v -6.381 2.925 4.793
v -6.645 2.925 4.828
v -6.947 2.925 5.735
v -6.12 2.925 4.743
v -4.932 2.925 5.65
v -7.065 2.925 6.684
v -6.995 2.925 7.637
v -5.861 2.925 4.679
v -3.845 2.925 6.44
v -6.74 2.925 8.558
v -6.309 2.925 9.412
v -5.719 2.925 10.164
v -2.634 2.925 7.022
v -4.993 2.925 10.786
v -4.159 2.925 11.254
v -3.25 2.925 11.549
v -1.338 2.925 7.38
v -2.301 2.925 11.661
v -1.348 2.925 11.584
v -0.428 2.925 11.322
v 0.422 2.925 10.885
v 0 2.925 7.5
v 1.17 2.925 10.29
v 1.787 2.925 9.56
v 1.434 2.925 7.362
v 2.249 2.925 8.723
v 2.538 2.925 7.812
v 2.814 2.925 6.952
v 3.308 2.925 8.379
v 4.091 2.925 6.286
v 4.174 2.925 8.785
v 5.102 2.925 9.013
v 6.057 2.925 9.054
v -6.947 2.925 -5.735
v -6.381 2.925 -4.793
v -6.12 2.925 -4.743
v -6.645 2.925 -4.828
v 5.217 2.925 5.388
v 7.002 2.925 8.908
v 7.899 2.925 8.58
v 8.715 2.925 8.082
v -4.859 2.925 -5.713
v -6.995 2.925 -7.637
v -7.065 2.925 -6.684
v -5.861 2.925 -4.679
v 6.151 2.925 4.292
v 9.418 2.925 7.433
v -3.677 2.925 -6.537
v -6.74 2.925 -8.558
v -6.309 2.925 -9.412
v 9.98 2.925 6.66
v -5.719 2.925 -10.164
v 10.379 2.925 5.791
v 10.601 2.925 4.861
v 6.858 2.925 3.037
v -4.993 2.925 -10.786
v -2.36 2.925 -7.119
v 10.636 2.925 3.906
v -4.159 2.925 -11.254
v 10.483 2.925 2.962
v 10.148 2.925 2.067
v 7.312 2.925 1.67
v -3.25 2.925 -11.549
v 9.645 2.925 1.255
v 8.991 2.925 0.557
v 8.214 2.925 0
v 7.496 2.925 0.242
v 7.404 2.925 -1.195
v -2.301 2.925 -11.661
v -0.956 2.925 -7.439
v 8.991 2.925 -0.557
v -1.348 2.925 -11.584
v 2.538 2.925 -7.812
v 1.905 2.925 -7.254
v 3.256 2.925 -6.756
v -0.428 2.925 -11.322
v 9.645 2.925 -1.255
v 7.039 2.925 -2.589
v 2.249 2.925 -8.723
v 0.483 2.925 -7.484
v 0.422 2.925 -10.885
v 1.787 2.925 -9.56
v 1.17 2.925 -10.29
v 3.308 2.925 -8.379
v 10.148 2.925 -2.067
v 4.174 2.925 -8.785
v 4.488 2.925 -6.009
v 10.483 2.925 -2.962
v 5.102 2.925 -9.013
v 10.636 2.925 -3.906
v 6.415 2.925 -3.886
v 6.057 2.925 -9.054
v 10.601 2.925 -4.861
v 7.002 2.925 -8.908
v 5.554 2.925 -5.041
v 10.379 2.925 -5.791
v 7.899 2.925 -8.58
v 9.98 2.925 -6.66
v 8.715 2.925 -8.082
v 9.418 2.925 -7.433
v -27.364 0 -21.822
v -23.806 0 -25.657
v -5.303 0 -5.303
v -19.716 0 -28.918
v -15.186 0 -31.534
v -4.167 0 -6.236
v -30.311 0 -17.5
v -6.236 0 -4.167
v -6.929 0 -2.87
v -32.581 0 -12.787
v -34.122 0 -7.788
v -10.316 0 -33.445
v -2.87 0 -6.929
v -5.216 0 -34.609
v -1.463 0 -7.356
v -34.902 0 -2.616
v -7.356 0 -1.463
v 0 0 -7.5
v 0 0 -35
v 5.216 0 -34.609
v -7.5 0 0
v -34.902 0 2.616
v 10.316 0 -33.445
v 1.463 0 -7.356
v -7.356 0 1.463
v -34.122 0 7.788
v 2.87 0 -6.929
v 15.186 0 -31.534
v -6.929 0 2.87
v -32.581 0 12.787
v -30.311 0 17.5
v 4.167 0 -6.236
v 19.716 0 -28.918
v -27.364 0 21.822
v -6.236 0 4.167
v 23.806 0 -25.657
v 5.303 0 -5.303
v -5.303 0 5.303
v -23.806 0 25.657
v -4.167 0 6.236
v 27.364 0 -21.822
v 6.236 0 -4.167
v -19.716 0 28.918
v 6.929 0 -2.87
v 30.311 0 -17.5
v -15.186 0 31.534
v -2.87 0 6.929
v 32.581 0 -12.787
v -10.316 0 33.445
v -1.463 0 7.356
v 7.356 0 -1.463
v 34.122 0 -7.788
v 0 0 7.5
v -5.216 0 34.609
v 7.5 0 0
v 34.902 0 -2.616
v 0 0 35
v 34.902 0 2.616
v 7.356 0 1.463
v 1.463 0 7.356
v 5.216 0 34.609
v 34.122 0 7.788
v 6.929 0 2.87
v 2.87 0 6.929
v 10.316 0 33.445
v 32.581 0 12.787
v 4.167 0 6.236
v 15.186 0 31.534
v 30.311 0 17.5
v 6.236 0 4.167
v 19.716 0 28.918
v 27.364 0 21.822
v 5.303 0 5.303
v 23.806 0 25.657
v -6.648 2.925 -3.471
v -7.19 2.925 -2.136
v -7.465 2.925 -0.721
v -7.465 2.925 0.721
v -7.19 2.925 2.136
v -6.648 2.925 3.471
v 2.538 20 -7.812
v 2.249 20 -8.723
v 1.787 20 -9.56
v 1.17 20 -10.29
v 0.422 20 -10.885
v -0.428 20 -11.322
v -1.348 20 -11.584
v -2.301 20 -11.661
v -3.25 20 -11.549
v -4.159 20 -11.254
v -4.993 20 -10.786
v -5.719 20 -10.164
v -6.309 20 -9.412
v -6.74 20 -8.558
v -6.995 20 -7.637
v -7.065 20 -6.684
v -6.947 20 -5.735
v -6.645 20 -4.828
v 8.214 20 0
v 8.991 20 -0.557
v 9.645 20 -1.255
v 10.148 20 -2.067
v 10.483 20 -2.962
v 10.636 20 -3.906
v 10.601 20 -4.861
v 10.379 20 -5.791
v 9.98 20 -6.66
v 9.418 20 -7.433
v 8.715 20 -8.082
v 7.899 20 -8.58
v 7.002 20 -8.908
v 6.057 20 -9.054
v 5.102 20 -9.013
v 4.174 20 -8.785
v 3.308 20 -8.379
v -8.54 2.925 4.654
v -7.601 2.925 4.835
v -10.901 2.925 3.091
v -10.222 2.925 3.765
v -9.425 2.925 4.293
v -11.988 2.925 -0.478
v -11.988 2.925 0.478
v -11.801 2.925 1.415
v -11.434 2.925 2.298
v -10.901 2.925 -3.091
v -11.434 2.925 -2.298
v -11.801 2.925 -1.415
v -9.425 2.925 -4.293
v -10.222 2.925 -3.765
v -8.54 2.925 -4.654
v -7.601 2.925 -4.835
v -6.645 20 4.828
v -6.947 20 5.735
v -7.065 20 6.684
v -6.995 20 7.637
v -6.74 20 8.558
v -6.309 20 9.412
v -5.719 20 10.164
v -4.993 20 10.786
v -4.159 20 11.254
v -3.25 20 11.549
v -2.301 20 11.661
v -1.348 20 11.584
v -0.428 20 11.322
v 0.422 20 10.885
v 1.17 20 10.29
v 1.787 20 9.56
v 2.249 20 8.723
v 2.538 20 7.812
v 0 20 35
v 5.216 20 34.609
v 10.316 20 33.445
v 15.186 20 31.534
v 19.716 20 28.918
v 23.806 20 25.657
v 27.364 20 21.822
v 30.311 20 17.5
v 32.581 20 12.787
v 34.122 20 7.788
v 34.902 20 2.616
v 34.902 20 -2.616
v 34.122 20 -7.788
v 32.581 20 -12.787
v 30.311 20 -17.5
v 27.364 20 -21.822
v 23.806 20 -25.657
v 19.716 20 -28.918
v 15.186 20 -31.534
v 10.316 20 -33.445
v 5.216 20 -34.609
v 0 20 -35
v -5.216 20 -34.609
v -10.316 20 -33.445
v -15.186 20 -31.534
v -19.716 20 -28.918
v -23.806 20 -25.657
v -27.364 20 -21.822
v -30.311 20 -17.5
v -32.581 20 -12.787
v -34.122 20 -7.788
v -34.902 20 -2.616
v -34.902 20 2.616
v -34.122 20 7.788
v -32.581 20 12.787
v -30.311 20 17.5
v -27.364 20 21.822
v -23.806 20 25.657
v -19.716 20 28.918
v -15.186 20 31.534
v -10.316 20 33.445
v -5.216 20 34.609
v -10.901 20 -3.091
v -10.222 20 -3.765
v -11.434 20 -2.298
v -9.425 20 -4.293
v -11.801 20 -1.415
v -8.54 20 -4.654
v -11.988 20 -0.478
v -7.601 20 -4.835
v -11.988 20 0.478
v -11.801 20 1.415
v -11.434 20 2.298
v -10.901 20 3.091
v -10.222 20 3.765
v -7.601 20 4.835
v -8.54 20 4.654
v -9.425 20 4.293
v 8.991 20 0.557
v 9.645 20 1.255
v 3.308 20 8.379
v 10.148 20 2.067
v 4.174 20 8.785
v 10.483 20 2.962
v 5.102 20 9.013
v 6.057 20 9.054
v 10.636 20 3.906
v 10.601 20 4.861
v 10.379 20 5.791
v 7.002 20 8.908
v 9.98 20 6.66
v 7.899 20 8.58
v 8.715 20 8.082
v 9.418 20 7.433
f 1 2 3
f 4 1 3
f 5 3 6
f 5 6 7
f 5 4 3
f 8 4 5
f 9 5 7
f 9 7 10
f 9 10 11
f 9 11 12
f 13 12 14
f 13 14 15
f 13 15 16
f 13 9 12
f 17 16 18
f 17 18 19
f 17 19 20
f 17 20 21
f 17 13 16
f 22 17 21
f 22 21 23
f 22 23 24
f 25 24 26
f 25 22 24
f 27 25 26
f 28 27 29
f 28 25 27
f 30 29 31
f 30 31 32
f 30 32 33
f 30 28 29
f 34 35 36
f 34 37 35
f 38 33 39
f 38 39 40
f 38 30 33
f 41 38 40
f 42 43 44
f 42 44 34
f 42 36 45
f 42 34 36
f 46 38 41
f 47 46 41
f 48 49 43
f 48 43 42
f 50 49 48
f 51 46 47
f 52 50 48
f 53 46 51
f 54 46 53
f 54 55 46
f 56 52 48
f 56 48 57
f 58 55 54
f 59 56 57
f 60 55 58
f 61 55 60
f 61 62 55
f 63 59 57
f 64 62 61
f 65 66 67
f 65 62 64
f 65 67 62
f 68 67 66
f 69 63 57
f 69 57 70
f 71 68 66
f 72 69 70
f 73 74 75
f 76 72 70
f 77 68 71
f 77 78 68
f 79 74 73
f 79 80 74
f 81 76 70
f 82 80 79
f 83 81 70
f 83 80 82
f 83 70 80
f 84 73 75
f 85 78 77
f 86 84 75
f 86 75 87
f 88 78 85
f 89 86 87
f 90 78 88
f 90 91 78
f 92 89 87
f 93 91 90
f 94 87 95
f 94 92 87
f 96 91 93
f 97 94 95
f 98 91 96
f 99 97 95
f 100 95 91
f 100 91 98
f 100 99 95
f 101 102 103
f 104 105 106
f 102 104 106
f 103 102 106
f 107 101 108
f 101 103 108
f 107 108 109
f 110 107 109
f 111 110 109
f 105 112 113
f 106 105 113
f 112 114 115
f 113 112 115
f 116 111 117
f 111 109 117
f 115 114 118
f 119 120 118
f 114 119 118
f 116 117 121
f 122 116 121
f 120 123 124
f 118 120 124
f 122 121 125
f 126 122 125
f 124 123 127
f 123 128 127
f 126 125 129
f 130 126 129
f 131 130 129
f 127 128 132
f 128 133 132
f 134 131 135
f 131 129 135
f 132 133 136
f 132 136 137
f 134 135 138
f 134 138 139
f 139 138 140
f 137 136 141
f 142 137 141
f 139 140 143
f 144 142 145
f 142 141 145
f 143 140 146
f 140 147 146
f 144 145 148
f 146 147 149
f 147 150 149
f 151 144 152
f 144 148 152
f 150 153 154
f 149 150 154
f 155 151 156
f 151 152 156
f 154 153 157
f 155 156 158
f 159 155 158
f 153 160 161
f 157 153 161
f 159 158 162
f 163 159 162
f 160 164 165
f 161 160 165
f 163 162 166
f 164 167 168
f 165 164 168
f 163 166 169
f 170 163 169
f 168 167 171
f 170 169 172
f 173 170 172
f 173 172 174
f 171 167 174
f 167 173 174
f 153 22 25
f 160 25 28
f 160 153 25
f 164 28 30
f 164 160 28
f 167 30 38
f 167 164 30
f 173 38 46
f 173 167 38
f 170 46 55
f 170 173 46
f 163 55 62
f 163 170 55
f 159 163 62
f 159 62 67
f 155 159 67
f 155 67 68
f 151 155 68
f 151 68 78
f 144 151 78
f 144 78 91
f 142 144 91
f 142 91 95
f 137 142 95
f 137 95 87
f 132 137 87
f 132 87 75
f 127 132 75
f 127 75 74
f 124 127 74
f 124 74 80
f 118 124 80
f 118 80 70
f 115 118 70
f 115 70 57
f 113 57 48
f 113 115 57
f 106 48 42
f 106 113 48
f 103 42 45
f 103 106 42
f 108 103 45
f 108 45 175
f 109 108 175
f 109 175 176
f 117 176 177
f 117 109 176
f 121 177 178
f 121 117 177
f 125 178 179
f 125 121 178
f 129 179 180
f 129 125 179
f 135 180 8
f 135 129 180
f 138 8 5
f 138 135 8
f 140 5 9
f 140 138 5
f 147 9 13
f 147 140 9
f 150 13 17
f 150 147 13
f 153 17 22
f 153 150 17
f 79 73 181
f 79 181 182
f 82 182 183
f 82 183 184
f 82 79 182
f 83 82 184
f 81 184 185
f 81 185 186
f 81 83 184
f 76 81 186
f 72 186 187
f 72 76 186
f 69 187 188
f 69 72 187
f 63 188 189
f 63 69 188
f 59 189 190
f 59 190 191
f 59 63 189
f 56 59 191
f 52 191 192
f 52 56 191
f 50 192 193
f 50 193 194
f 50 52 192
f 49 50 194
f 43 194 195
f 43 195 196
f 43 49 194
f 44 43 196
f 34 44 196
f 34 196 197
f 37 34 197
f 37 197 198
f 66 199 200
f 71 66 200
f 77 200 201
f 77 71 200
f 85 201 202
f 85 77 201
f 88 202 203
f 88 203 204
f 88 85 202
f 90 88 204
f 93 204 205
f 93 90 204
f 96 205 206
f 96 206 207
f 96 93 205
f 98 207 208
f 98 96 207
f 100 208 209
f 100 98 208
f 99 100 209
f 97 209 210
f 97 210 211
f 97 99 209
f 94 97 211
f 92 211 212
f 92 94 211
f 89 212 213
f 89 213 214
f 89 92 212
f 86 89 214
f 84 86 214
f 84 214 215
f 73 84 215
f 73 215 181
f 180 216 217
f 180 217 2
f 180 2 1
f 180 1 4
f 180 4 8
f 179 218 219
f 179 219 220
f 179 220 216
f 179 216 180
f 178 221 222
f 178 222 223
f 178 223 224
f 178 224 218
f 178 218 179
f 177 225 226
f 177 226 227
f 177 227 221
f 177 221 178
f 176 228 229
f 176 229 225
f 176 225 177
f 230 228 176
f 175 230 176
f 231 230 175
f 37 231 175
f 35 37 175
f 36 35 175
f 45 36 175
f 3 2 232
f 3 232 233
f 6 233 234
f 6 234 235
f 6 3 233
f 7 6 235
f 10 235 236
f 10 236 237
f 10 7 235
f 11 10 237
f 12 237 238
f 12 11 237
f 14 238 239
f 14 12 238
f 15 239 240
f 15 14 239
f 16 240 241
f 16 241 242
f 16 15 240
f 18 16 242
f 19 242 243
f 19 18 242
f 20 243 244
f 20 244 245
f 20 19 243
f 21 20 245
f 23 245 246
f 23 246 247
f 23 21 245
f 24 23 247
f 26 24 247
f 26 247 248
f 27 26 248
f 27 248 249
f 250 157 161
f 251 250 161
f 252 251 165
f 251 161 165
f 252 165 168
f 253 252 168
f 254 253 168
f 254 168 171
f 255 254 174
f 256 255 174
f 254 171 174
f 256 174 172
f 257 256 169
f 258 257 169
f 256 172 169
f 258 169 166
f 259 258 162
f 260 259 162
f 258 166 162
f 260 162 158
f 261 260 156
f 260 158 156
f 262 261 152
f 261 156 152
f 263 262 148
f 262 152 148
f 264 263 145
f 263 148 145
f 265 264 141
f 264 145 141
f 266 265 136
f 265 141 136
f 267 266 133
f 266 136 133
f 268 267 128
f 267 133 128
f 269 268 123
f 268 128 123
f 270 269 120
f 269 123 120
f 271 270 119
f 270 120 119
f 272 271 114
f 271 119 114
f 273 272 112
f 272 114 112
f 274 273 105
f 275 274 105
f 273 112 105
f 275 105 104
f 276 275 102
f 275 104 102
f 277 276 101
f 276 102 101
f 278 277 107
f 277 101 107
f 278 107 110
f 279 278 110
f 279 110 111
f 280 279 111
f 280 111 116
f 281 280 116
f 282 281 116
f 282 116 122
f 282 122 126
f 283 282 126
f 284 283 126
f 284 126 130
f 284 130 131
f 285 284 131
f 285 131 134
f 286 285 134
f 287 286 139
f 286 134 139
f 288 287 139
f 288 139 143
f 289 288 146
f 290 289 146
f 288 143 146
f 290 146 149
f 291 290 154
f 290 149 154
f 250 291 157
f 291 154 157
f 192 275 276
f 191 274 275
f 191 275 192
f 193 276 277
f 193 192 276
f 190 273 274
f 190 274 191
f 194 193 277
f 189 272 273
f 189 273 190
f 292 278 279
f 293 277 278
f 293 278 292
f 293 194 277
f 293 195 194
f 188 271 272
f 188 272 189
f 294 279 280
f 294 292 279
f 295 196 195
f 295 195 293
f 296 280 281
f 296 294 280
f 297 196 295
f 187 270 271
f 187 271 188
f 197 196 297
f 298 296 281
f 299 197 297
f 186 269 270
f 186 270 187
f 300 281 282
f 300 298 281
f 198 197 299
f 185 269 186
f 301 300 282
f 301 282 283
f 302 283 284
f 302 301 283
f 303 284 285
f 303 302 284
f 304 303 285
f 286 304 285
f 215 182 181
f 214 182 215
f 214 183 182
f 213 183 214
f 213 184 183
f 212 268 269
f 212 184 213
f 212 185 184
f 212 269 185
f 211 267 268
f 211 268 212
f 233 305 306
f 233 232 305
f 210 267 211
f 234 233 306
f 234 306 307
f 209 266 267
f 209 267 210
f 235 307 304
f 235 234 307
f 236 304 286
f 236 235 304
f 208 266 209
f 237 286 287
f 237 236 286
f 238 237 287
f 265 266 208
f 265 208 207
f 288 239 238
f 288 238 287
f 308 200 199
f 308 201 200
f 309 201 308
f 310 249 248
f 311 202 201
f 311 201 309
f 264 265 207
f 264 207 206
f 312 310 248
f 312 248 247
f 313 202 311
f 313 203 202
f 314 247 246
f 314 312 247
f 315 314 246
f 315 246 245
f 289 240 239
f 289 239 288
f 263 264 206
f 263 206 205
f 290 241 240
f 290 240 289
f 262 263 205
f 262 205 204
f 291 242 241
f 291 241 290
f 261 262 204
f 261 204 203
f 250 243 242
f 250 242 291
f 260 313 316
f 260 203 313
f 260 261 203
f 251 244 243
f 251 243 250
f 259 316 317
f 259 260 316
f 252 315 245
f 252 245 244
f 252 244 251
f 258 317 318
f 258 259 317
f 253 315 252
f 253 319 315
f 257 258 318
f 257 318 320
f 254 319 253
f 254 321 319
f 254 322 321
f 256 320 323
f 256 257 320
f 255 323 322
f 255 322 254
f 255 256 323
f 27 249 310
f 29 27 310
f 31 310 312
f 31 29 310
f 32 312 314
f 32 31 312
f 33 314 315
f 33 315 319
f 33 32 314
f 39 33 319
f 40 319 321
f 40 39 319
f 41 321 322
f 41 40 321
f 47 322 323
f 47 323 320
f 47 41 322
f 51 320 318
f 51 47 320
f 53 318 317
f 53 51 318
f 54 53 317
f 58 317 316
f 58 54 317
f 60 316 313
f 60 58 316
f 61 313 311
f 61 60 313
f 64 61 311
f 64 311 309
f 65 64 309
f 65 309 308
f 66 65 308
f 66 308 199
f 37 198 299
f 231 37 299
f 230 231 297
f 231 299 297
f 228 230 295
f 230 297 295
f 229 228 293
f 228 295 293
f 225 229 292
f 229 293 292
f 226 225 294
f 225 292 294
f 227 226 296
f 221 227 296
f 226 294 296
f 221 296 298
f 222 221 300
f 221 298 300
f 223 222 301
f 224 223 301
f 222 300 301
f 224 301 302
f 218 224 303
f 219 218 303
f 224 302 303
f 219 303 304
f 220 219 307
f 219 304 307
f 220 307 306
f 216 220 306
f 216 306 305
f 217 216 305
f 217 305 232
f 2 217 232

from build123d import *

# Parameters (mm, degrees)
SKETCH1_R           = 35
BOSS_EXTRUDE1_DEPTH = 20
SKETCH2_R           = 7.5
CUT_EXTRUDE1_DEPTH  = 54.38539126
SKETCH3_R           = 4.855176947
CUT_EXTRUDE2_DEPTH  = 17.075258824
CIRPATTERN1_COUNT   = 5


with BuildPart() as part:
    # Sketch1 → Boss-Extrude1 (new body)
    with BuildSketch(Plane(origin=(0, 0, 0), x_dir=(1, 0, 0), z_dir=(0, 1, 0))):
        Circle(SKETCH1_R)
    extrude(amount=BOSS_EXTRUDE1_DEPTH)

    # Sketch2 → Cut-Extrude1 (cut, through all)
    with BuildSketch(Plane(origin=(0, 0, 0), x_dir=(1, 0, 0), z_dir=(0, 1, 0))):
        Circle(SKETCH2_R)
    extrude(amount=CUT_EXTRUDE1_DEPTH, mode=Mode.SUBTRACT)

    # Sketch3 → Cut-Extrude2 (cut)
    with BuildSketch(Plane(origin=(0, 20, 0), x_dir=(1, 0, 0), z_dir=(0, 1, 0))):
        with Locations((-7.156774824, 0)):
            Circle(SKETCH3_R)
    cut_extrude2 = extrude(amount=-CUT_EXTRUDE2_DEPTH, mode=Mode.SUBTRACT)

    # CirPattern1: Cut-Extrude2 ×5 about axis
    cirpattern1_axis = Axis((0, 0, 0), (0, 1, 0))
    for i in range(1, CIRPATTERN1_COUNT):
        add(cut_extrude2.rotate(cirpattern1_axis, i * 360 / CIRPATTERN1_COUNT), mode=Mode.SUBTRACT)


solid = part.part
